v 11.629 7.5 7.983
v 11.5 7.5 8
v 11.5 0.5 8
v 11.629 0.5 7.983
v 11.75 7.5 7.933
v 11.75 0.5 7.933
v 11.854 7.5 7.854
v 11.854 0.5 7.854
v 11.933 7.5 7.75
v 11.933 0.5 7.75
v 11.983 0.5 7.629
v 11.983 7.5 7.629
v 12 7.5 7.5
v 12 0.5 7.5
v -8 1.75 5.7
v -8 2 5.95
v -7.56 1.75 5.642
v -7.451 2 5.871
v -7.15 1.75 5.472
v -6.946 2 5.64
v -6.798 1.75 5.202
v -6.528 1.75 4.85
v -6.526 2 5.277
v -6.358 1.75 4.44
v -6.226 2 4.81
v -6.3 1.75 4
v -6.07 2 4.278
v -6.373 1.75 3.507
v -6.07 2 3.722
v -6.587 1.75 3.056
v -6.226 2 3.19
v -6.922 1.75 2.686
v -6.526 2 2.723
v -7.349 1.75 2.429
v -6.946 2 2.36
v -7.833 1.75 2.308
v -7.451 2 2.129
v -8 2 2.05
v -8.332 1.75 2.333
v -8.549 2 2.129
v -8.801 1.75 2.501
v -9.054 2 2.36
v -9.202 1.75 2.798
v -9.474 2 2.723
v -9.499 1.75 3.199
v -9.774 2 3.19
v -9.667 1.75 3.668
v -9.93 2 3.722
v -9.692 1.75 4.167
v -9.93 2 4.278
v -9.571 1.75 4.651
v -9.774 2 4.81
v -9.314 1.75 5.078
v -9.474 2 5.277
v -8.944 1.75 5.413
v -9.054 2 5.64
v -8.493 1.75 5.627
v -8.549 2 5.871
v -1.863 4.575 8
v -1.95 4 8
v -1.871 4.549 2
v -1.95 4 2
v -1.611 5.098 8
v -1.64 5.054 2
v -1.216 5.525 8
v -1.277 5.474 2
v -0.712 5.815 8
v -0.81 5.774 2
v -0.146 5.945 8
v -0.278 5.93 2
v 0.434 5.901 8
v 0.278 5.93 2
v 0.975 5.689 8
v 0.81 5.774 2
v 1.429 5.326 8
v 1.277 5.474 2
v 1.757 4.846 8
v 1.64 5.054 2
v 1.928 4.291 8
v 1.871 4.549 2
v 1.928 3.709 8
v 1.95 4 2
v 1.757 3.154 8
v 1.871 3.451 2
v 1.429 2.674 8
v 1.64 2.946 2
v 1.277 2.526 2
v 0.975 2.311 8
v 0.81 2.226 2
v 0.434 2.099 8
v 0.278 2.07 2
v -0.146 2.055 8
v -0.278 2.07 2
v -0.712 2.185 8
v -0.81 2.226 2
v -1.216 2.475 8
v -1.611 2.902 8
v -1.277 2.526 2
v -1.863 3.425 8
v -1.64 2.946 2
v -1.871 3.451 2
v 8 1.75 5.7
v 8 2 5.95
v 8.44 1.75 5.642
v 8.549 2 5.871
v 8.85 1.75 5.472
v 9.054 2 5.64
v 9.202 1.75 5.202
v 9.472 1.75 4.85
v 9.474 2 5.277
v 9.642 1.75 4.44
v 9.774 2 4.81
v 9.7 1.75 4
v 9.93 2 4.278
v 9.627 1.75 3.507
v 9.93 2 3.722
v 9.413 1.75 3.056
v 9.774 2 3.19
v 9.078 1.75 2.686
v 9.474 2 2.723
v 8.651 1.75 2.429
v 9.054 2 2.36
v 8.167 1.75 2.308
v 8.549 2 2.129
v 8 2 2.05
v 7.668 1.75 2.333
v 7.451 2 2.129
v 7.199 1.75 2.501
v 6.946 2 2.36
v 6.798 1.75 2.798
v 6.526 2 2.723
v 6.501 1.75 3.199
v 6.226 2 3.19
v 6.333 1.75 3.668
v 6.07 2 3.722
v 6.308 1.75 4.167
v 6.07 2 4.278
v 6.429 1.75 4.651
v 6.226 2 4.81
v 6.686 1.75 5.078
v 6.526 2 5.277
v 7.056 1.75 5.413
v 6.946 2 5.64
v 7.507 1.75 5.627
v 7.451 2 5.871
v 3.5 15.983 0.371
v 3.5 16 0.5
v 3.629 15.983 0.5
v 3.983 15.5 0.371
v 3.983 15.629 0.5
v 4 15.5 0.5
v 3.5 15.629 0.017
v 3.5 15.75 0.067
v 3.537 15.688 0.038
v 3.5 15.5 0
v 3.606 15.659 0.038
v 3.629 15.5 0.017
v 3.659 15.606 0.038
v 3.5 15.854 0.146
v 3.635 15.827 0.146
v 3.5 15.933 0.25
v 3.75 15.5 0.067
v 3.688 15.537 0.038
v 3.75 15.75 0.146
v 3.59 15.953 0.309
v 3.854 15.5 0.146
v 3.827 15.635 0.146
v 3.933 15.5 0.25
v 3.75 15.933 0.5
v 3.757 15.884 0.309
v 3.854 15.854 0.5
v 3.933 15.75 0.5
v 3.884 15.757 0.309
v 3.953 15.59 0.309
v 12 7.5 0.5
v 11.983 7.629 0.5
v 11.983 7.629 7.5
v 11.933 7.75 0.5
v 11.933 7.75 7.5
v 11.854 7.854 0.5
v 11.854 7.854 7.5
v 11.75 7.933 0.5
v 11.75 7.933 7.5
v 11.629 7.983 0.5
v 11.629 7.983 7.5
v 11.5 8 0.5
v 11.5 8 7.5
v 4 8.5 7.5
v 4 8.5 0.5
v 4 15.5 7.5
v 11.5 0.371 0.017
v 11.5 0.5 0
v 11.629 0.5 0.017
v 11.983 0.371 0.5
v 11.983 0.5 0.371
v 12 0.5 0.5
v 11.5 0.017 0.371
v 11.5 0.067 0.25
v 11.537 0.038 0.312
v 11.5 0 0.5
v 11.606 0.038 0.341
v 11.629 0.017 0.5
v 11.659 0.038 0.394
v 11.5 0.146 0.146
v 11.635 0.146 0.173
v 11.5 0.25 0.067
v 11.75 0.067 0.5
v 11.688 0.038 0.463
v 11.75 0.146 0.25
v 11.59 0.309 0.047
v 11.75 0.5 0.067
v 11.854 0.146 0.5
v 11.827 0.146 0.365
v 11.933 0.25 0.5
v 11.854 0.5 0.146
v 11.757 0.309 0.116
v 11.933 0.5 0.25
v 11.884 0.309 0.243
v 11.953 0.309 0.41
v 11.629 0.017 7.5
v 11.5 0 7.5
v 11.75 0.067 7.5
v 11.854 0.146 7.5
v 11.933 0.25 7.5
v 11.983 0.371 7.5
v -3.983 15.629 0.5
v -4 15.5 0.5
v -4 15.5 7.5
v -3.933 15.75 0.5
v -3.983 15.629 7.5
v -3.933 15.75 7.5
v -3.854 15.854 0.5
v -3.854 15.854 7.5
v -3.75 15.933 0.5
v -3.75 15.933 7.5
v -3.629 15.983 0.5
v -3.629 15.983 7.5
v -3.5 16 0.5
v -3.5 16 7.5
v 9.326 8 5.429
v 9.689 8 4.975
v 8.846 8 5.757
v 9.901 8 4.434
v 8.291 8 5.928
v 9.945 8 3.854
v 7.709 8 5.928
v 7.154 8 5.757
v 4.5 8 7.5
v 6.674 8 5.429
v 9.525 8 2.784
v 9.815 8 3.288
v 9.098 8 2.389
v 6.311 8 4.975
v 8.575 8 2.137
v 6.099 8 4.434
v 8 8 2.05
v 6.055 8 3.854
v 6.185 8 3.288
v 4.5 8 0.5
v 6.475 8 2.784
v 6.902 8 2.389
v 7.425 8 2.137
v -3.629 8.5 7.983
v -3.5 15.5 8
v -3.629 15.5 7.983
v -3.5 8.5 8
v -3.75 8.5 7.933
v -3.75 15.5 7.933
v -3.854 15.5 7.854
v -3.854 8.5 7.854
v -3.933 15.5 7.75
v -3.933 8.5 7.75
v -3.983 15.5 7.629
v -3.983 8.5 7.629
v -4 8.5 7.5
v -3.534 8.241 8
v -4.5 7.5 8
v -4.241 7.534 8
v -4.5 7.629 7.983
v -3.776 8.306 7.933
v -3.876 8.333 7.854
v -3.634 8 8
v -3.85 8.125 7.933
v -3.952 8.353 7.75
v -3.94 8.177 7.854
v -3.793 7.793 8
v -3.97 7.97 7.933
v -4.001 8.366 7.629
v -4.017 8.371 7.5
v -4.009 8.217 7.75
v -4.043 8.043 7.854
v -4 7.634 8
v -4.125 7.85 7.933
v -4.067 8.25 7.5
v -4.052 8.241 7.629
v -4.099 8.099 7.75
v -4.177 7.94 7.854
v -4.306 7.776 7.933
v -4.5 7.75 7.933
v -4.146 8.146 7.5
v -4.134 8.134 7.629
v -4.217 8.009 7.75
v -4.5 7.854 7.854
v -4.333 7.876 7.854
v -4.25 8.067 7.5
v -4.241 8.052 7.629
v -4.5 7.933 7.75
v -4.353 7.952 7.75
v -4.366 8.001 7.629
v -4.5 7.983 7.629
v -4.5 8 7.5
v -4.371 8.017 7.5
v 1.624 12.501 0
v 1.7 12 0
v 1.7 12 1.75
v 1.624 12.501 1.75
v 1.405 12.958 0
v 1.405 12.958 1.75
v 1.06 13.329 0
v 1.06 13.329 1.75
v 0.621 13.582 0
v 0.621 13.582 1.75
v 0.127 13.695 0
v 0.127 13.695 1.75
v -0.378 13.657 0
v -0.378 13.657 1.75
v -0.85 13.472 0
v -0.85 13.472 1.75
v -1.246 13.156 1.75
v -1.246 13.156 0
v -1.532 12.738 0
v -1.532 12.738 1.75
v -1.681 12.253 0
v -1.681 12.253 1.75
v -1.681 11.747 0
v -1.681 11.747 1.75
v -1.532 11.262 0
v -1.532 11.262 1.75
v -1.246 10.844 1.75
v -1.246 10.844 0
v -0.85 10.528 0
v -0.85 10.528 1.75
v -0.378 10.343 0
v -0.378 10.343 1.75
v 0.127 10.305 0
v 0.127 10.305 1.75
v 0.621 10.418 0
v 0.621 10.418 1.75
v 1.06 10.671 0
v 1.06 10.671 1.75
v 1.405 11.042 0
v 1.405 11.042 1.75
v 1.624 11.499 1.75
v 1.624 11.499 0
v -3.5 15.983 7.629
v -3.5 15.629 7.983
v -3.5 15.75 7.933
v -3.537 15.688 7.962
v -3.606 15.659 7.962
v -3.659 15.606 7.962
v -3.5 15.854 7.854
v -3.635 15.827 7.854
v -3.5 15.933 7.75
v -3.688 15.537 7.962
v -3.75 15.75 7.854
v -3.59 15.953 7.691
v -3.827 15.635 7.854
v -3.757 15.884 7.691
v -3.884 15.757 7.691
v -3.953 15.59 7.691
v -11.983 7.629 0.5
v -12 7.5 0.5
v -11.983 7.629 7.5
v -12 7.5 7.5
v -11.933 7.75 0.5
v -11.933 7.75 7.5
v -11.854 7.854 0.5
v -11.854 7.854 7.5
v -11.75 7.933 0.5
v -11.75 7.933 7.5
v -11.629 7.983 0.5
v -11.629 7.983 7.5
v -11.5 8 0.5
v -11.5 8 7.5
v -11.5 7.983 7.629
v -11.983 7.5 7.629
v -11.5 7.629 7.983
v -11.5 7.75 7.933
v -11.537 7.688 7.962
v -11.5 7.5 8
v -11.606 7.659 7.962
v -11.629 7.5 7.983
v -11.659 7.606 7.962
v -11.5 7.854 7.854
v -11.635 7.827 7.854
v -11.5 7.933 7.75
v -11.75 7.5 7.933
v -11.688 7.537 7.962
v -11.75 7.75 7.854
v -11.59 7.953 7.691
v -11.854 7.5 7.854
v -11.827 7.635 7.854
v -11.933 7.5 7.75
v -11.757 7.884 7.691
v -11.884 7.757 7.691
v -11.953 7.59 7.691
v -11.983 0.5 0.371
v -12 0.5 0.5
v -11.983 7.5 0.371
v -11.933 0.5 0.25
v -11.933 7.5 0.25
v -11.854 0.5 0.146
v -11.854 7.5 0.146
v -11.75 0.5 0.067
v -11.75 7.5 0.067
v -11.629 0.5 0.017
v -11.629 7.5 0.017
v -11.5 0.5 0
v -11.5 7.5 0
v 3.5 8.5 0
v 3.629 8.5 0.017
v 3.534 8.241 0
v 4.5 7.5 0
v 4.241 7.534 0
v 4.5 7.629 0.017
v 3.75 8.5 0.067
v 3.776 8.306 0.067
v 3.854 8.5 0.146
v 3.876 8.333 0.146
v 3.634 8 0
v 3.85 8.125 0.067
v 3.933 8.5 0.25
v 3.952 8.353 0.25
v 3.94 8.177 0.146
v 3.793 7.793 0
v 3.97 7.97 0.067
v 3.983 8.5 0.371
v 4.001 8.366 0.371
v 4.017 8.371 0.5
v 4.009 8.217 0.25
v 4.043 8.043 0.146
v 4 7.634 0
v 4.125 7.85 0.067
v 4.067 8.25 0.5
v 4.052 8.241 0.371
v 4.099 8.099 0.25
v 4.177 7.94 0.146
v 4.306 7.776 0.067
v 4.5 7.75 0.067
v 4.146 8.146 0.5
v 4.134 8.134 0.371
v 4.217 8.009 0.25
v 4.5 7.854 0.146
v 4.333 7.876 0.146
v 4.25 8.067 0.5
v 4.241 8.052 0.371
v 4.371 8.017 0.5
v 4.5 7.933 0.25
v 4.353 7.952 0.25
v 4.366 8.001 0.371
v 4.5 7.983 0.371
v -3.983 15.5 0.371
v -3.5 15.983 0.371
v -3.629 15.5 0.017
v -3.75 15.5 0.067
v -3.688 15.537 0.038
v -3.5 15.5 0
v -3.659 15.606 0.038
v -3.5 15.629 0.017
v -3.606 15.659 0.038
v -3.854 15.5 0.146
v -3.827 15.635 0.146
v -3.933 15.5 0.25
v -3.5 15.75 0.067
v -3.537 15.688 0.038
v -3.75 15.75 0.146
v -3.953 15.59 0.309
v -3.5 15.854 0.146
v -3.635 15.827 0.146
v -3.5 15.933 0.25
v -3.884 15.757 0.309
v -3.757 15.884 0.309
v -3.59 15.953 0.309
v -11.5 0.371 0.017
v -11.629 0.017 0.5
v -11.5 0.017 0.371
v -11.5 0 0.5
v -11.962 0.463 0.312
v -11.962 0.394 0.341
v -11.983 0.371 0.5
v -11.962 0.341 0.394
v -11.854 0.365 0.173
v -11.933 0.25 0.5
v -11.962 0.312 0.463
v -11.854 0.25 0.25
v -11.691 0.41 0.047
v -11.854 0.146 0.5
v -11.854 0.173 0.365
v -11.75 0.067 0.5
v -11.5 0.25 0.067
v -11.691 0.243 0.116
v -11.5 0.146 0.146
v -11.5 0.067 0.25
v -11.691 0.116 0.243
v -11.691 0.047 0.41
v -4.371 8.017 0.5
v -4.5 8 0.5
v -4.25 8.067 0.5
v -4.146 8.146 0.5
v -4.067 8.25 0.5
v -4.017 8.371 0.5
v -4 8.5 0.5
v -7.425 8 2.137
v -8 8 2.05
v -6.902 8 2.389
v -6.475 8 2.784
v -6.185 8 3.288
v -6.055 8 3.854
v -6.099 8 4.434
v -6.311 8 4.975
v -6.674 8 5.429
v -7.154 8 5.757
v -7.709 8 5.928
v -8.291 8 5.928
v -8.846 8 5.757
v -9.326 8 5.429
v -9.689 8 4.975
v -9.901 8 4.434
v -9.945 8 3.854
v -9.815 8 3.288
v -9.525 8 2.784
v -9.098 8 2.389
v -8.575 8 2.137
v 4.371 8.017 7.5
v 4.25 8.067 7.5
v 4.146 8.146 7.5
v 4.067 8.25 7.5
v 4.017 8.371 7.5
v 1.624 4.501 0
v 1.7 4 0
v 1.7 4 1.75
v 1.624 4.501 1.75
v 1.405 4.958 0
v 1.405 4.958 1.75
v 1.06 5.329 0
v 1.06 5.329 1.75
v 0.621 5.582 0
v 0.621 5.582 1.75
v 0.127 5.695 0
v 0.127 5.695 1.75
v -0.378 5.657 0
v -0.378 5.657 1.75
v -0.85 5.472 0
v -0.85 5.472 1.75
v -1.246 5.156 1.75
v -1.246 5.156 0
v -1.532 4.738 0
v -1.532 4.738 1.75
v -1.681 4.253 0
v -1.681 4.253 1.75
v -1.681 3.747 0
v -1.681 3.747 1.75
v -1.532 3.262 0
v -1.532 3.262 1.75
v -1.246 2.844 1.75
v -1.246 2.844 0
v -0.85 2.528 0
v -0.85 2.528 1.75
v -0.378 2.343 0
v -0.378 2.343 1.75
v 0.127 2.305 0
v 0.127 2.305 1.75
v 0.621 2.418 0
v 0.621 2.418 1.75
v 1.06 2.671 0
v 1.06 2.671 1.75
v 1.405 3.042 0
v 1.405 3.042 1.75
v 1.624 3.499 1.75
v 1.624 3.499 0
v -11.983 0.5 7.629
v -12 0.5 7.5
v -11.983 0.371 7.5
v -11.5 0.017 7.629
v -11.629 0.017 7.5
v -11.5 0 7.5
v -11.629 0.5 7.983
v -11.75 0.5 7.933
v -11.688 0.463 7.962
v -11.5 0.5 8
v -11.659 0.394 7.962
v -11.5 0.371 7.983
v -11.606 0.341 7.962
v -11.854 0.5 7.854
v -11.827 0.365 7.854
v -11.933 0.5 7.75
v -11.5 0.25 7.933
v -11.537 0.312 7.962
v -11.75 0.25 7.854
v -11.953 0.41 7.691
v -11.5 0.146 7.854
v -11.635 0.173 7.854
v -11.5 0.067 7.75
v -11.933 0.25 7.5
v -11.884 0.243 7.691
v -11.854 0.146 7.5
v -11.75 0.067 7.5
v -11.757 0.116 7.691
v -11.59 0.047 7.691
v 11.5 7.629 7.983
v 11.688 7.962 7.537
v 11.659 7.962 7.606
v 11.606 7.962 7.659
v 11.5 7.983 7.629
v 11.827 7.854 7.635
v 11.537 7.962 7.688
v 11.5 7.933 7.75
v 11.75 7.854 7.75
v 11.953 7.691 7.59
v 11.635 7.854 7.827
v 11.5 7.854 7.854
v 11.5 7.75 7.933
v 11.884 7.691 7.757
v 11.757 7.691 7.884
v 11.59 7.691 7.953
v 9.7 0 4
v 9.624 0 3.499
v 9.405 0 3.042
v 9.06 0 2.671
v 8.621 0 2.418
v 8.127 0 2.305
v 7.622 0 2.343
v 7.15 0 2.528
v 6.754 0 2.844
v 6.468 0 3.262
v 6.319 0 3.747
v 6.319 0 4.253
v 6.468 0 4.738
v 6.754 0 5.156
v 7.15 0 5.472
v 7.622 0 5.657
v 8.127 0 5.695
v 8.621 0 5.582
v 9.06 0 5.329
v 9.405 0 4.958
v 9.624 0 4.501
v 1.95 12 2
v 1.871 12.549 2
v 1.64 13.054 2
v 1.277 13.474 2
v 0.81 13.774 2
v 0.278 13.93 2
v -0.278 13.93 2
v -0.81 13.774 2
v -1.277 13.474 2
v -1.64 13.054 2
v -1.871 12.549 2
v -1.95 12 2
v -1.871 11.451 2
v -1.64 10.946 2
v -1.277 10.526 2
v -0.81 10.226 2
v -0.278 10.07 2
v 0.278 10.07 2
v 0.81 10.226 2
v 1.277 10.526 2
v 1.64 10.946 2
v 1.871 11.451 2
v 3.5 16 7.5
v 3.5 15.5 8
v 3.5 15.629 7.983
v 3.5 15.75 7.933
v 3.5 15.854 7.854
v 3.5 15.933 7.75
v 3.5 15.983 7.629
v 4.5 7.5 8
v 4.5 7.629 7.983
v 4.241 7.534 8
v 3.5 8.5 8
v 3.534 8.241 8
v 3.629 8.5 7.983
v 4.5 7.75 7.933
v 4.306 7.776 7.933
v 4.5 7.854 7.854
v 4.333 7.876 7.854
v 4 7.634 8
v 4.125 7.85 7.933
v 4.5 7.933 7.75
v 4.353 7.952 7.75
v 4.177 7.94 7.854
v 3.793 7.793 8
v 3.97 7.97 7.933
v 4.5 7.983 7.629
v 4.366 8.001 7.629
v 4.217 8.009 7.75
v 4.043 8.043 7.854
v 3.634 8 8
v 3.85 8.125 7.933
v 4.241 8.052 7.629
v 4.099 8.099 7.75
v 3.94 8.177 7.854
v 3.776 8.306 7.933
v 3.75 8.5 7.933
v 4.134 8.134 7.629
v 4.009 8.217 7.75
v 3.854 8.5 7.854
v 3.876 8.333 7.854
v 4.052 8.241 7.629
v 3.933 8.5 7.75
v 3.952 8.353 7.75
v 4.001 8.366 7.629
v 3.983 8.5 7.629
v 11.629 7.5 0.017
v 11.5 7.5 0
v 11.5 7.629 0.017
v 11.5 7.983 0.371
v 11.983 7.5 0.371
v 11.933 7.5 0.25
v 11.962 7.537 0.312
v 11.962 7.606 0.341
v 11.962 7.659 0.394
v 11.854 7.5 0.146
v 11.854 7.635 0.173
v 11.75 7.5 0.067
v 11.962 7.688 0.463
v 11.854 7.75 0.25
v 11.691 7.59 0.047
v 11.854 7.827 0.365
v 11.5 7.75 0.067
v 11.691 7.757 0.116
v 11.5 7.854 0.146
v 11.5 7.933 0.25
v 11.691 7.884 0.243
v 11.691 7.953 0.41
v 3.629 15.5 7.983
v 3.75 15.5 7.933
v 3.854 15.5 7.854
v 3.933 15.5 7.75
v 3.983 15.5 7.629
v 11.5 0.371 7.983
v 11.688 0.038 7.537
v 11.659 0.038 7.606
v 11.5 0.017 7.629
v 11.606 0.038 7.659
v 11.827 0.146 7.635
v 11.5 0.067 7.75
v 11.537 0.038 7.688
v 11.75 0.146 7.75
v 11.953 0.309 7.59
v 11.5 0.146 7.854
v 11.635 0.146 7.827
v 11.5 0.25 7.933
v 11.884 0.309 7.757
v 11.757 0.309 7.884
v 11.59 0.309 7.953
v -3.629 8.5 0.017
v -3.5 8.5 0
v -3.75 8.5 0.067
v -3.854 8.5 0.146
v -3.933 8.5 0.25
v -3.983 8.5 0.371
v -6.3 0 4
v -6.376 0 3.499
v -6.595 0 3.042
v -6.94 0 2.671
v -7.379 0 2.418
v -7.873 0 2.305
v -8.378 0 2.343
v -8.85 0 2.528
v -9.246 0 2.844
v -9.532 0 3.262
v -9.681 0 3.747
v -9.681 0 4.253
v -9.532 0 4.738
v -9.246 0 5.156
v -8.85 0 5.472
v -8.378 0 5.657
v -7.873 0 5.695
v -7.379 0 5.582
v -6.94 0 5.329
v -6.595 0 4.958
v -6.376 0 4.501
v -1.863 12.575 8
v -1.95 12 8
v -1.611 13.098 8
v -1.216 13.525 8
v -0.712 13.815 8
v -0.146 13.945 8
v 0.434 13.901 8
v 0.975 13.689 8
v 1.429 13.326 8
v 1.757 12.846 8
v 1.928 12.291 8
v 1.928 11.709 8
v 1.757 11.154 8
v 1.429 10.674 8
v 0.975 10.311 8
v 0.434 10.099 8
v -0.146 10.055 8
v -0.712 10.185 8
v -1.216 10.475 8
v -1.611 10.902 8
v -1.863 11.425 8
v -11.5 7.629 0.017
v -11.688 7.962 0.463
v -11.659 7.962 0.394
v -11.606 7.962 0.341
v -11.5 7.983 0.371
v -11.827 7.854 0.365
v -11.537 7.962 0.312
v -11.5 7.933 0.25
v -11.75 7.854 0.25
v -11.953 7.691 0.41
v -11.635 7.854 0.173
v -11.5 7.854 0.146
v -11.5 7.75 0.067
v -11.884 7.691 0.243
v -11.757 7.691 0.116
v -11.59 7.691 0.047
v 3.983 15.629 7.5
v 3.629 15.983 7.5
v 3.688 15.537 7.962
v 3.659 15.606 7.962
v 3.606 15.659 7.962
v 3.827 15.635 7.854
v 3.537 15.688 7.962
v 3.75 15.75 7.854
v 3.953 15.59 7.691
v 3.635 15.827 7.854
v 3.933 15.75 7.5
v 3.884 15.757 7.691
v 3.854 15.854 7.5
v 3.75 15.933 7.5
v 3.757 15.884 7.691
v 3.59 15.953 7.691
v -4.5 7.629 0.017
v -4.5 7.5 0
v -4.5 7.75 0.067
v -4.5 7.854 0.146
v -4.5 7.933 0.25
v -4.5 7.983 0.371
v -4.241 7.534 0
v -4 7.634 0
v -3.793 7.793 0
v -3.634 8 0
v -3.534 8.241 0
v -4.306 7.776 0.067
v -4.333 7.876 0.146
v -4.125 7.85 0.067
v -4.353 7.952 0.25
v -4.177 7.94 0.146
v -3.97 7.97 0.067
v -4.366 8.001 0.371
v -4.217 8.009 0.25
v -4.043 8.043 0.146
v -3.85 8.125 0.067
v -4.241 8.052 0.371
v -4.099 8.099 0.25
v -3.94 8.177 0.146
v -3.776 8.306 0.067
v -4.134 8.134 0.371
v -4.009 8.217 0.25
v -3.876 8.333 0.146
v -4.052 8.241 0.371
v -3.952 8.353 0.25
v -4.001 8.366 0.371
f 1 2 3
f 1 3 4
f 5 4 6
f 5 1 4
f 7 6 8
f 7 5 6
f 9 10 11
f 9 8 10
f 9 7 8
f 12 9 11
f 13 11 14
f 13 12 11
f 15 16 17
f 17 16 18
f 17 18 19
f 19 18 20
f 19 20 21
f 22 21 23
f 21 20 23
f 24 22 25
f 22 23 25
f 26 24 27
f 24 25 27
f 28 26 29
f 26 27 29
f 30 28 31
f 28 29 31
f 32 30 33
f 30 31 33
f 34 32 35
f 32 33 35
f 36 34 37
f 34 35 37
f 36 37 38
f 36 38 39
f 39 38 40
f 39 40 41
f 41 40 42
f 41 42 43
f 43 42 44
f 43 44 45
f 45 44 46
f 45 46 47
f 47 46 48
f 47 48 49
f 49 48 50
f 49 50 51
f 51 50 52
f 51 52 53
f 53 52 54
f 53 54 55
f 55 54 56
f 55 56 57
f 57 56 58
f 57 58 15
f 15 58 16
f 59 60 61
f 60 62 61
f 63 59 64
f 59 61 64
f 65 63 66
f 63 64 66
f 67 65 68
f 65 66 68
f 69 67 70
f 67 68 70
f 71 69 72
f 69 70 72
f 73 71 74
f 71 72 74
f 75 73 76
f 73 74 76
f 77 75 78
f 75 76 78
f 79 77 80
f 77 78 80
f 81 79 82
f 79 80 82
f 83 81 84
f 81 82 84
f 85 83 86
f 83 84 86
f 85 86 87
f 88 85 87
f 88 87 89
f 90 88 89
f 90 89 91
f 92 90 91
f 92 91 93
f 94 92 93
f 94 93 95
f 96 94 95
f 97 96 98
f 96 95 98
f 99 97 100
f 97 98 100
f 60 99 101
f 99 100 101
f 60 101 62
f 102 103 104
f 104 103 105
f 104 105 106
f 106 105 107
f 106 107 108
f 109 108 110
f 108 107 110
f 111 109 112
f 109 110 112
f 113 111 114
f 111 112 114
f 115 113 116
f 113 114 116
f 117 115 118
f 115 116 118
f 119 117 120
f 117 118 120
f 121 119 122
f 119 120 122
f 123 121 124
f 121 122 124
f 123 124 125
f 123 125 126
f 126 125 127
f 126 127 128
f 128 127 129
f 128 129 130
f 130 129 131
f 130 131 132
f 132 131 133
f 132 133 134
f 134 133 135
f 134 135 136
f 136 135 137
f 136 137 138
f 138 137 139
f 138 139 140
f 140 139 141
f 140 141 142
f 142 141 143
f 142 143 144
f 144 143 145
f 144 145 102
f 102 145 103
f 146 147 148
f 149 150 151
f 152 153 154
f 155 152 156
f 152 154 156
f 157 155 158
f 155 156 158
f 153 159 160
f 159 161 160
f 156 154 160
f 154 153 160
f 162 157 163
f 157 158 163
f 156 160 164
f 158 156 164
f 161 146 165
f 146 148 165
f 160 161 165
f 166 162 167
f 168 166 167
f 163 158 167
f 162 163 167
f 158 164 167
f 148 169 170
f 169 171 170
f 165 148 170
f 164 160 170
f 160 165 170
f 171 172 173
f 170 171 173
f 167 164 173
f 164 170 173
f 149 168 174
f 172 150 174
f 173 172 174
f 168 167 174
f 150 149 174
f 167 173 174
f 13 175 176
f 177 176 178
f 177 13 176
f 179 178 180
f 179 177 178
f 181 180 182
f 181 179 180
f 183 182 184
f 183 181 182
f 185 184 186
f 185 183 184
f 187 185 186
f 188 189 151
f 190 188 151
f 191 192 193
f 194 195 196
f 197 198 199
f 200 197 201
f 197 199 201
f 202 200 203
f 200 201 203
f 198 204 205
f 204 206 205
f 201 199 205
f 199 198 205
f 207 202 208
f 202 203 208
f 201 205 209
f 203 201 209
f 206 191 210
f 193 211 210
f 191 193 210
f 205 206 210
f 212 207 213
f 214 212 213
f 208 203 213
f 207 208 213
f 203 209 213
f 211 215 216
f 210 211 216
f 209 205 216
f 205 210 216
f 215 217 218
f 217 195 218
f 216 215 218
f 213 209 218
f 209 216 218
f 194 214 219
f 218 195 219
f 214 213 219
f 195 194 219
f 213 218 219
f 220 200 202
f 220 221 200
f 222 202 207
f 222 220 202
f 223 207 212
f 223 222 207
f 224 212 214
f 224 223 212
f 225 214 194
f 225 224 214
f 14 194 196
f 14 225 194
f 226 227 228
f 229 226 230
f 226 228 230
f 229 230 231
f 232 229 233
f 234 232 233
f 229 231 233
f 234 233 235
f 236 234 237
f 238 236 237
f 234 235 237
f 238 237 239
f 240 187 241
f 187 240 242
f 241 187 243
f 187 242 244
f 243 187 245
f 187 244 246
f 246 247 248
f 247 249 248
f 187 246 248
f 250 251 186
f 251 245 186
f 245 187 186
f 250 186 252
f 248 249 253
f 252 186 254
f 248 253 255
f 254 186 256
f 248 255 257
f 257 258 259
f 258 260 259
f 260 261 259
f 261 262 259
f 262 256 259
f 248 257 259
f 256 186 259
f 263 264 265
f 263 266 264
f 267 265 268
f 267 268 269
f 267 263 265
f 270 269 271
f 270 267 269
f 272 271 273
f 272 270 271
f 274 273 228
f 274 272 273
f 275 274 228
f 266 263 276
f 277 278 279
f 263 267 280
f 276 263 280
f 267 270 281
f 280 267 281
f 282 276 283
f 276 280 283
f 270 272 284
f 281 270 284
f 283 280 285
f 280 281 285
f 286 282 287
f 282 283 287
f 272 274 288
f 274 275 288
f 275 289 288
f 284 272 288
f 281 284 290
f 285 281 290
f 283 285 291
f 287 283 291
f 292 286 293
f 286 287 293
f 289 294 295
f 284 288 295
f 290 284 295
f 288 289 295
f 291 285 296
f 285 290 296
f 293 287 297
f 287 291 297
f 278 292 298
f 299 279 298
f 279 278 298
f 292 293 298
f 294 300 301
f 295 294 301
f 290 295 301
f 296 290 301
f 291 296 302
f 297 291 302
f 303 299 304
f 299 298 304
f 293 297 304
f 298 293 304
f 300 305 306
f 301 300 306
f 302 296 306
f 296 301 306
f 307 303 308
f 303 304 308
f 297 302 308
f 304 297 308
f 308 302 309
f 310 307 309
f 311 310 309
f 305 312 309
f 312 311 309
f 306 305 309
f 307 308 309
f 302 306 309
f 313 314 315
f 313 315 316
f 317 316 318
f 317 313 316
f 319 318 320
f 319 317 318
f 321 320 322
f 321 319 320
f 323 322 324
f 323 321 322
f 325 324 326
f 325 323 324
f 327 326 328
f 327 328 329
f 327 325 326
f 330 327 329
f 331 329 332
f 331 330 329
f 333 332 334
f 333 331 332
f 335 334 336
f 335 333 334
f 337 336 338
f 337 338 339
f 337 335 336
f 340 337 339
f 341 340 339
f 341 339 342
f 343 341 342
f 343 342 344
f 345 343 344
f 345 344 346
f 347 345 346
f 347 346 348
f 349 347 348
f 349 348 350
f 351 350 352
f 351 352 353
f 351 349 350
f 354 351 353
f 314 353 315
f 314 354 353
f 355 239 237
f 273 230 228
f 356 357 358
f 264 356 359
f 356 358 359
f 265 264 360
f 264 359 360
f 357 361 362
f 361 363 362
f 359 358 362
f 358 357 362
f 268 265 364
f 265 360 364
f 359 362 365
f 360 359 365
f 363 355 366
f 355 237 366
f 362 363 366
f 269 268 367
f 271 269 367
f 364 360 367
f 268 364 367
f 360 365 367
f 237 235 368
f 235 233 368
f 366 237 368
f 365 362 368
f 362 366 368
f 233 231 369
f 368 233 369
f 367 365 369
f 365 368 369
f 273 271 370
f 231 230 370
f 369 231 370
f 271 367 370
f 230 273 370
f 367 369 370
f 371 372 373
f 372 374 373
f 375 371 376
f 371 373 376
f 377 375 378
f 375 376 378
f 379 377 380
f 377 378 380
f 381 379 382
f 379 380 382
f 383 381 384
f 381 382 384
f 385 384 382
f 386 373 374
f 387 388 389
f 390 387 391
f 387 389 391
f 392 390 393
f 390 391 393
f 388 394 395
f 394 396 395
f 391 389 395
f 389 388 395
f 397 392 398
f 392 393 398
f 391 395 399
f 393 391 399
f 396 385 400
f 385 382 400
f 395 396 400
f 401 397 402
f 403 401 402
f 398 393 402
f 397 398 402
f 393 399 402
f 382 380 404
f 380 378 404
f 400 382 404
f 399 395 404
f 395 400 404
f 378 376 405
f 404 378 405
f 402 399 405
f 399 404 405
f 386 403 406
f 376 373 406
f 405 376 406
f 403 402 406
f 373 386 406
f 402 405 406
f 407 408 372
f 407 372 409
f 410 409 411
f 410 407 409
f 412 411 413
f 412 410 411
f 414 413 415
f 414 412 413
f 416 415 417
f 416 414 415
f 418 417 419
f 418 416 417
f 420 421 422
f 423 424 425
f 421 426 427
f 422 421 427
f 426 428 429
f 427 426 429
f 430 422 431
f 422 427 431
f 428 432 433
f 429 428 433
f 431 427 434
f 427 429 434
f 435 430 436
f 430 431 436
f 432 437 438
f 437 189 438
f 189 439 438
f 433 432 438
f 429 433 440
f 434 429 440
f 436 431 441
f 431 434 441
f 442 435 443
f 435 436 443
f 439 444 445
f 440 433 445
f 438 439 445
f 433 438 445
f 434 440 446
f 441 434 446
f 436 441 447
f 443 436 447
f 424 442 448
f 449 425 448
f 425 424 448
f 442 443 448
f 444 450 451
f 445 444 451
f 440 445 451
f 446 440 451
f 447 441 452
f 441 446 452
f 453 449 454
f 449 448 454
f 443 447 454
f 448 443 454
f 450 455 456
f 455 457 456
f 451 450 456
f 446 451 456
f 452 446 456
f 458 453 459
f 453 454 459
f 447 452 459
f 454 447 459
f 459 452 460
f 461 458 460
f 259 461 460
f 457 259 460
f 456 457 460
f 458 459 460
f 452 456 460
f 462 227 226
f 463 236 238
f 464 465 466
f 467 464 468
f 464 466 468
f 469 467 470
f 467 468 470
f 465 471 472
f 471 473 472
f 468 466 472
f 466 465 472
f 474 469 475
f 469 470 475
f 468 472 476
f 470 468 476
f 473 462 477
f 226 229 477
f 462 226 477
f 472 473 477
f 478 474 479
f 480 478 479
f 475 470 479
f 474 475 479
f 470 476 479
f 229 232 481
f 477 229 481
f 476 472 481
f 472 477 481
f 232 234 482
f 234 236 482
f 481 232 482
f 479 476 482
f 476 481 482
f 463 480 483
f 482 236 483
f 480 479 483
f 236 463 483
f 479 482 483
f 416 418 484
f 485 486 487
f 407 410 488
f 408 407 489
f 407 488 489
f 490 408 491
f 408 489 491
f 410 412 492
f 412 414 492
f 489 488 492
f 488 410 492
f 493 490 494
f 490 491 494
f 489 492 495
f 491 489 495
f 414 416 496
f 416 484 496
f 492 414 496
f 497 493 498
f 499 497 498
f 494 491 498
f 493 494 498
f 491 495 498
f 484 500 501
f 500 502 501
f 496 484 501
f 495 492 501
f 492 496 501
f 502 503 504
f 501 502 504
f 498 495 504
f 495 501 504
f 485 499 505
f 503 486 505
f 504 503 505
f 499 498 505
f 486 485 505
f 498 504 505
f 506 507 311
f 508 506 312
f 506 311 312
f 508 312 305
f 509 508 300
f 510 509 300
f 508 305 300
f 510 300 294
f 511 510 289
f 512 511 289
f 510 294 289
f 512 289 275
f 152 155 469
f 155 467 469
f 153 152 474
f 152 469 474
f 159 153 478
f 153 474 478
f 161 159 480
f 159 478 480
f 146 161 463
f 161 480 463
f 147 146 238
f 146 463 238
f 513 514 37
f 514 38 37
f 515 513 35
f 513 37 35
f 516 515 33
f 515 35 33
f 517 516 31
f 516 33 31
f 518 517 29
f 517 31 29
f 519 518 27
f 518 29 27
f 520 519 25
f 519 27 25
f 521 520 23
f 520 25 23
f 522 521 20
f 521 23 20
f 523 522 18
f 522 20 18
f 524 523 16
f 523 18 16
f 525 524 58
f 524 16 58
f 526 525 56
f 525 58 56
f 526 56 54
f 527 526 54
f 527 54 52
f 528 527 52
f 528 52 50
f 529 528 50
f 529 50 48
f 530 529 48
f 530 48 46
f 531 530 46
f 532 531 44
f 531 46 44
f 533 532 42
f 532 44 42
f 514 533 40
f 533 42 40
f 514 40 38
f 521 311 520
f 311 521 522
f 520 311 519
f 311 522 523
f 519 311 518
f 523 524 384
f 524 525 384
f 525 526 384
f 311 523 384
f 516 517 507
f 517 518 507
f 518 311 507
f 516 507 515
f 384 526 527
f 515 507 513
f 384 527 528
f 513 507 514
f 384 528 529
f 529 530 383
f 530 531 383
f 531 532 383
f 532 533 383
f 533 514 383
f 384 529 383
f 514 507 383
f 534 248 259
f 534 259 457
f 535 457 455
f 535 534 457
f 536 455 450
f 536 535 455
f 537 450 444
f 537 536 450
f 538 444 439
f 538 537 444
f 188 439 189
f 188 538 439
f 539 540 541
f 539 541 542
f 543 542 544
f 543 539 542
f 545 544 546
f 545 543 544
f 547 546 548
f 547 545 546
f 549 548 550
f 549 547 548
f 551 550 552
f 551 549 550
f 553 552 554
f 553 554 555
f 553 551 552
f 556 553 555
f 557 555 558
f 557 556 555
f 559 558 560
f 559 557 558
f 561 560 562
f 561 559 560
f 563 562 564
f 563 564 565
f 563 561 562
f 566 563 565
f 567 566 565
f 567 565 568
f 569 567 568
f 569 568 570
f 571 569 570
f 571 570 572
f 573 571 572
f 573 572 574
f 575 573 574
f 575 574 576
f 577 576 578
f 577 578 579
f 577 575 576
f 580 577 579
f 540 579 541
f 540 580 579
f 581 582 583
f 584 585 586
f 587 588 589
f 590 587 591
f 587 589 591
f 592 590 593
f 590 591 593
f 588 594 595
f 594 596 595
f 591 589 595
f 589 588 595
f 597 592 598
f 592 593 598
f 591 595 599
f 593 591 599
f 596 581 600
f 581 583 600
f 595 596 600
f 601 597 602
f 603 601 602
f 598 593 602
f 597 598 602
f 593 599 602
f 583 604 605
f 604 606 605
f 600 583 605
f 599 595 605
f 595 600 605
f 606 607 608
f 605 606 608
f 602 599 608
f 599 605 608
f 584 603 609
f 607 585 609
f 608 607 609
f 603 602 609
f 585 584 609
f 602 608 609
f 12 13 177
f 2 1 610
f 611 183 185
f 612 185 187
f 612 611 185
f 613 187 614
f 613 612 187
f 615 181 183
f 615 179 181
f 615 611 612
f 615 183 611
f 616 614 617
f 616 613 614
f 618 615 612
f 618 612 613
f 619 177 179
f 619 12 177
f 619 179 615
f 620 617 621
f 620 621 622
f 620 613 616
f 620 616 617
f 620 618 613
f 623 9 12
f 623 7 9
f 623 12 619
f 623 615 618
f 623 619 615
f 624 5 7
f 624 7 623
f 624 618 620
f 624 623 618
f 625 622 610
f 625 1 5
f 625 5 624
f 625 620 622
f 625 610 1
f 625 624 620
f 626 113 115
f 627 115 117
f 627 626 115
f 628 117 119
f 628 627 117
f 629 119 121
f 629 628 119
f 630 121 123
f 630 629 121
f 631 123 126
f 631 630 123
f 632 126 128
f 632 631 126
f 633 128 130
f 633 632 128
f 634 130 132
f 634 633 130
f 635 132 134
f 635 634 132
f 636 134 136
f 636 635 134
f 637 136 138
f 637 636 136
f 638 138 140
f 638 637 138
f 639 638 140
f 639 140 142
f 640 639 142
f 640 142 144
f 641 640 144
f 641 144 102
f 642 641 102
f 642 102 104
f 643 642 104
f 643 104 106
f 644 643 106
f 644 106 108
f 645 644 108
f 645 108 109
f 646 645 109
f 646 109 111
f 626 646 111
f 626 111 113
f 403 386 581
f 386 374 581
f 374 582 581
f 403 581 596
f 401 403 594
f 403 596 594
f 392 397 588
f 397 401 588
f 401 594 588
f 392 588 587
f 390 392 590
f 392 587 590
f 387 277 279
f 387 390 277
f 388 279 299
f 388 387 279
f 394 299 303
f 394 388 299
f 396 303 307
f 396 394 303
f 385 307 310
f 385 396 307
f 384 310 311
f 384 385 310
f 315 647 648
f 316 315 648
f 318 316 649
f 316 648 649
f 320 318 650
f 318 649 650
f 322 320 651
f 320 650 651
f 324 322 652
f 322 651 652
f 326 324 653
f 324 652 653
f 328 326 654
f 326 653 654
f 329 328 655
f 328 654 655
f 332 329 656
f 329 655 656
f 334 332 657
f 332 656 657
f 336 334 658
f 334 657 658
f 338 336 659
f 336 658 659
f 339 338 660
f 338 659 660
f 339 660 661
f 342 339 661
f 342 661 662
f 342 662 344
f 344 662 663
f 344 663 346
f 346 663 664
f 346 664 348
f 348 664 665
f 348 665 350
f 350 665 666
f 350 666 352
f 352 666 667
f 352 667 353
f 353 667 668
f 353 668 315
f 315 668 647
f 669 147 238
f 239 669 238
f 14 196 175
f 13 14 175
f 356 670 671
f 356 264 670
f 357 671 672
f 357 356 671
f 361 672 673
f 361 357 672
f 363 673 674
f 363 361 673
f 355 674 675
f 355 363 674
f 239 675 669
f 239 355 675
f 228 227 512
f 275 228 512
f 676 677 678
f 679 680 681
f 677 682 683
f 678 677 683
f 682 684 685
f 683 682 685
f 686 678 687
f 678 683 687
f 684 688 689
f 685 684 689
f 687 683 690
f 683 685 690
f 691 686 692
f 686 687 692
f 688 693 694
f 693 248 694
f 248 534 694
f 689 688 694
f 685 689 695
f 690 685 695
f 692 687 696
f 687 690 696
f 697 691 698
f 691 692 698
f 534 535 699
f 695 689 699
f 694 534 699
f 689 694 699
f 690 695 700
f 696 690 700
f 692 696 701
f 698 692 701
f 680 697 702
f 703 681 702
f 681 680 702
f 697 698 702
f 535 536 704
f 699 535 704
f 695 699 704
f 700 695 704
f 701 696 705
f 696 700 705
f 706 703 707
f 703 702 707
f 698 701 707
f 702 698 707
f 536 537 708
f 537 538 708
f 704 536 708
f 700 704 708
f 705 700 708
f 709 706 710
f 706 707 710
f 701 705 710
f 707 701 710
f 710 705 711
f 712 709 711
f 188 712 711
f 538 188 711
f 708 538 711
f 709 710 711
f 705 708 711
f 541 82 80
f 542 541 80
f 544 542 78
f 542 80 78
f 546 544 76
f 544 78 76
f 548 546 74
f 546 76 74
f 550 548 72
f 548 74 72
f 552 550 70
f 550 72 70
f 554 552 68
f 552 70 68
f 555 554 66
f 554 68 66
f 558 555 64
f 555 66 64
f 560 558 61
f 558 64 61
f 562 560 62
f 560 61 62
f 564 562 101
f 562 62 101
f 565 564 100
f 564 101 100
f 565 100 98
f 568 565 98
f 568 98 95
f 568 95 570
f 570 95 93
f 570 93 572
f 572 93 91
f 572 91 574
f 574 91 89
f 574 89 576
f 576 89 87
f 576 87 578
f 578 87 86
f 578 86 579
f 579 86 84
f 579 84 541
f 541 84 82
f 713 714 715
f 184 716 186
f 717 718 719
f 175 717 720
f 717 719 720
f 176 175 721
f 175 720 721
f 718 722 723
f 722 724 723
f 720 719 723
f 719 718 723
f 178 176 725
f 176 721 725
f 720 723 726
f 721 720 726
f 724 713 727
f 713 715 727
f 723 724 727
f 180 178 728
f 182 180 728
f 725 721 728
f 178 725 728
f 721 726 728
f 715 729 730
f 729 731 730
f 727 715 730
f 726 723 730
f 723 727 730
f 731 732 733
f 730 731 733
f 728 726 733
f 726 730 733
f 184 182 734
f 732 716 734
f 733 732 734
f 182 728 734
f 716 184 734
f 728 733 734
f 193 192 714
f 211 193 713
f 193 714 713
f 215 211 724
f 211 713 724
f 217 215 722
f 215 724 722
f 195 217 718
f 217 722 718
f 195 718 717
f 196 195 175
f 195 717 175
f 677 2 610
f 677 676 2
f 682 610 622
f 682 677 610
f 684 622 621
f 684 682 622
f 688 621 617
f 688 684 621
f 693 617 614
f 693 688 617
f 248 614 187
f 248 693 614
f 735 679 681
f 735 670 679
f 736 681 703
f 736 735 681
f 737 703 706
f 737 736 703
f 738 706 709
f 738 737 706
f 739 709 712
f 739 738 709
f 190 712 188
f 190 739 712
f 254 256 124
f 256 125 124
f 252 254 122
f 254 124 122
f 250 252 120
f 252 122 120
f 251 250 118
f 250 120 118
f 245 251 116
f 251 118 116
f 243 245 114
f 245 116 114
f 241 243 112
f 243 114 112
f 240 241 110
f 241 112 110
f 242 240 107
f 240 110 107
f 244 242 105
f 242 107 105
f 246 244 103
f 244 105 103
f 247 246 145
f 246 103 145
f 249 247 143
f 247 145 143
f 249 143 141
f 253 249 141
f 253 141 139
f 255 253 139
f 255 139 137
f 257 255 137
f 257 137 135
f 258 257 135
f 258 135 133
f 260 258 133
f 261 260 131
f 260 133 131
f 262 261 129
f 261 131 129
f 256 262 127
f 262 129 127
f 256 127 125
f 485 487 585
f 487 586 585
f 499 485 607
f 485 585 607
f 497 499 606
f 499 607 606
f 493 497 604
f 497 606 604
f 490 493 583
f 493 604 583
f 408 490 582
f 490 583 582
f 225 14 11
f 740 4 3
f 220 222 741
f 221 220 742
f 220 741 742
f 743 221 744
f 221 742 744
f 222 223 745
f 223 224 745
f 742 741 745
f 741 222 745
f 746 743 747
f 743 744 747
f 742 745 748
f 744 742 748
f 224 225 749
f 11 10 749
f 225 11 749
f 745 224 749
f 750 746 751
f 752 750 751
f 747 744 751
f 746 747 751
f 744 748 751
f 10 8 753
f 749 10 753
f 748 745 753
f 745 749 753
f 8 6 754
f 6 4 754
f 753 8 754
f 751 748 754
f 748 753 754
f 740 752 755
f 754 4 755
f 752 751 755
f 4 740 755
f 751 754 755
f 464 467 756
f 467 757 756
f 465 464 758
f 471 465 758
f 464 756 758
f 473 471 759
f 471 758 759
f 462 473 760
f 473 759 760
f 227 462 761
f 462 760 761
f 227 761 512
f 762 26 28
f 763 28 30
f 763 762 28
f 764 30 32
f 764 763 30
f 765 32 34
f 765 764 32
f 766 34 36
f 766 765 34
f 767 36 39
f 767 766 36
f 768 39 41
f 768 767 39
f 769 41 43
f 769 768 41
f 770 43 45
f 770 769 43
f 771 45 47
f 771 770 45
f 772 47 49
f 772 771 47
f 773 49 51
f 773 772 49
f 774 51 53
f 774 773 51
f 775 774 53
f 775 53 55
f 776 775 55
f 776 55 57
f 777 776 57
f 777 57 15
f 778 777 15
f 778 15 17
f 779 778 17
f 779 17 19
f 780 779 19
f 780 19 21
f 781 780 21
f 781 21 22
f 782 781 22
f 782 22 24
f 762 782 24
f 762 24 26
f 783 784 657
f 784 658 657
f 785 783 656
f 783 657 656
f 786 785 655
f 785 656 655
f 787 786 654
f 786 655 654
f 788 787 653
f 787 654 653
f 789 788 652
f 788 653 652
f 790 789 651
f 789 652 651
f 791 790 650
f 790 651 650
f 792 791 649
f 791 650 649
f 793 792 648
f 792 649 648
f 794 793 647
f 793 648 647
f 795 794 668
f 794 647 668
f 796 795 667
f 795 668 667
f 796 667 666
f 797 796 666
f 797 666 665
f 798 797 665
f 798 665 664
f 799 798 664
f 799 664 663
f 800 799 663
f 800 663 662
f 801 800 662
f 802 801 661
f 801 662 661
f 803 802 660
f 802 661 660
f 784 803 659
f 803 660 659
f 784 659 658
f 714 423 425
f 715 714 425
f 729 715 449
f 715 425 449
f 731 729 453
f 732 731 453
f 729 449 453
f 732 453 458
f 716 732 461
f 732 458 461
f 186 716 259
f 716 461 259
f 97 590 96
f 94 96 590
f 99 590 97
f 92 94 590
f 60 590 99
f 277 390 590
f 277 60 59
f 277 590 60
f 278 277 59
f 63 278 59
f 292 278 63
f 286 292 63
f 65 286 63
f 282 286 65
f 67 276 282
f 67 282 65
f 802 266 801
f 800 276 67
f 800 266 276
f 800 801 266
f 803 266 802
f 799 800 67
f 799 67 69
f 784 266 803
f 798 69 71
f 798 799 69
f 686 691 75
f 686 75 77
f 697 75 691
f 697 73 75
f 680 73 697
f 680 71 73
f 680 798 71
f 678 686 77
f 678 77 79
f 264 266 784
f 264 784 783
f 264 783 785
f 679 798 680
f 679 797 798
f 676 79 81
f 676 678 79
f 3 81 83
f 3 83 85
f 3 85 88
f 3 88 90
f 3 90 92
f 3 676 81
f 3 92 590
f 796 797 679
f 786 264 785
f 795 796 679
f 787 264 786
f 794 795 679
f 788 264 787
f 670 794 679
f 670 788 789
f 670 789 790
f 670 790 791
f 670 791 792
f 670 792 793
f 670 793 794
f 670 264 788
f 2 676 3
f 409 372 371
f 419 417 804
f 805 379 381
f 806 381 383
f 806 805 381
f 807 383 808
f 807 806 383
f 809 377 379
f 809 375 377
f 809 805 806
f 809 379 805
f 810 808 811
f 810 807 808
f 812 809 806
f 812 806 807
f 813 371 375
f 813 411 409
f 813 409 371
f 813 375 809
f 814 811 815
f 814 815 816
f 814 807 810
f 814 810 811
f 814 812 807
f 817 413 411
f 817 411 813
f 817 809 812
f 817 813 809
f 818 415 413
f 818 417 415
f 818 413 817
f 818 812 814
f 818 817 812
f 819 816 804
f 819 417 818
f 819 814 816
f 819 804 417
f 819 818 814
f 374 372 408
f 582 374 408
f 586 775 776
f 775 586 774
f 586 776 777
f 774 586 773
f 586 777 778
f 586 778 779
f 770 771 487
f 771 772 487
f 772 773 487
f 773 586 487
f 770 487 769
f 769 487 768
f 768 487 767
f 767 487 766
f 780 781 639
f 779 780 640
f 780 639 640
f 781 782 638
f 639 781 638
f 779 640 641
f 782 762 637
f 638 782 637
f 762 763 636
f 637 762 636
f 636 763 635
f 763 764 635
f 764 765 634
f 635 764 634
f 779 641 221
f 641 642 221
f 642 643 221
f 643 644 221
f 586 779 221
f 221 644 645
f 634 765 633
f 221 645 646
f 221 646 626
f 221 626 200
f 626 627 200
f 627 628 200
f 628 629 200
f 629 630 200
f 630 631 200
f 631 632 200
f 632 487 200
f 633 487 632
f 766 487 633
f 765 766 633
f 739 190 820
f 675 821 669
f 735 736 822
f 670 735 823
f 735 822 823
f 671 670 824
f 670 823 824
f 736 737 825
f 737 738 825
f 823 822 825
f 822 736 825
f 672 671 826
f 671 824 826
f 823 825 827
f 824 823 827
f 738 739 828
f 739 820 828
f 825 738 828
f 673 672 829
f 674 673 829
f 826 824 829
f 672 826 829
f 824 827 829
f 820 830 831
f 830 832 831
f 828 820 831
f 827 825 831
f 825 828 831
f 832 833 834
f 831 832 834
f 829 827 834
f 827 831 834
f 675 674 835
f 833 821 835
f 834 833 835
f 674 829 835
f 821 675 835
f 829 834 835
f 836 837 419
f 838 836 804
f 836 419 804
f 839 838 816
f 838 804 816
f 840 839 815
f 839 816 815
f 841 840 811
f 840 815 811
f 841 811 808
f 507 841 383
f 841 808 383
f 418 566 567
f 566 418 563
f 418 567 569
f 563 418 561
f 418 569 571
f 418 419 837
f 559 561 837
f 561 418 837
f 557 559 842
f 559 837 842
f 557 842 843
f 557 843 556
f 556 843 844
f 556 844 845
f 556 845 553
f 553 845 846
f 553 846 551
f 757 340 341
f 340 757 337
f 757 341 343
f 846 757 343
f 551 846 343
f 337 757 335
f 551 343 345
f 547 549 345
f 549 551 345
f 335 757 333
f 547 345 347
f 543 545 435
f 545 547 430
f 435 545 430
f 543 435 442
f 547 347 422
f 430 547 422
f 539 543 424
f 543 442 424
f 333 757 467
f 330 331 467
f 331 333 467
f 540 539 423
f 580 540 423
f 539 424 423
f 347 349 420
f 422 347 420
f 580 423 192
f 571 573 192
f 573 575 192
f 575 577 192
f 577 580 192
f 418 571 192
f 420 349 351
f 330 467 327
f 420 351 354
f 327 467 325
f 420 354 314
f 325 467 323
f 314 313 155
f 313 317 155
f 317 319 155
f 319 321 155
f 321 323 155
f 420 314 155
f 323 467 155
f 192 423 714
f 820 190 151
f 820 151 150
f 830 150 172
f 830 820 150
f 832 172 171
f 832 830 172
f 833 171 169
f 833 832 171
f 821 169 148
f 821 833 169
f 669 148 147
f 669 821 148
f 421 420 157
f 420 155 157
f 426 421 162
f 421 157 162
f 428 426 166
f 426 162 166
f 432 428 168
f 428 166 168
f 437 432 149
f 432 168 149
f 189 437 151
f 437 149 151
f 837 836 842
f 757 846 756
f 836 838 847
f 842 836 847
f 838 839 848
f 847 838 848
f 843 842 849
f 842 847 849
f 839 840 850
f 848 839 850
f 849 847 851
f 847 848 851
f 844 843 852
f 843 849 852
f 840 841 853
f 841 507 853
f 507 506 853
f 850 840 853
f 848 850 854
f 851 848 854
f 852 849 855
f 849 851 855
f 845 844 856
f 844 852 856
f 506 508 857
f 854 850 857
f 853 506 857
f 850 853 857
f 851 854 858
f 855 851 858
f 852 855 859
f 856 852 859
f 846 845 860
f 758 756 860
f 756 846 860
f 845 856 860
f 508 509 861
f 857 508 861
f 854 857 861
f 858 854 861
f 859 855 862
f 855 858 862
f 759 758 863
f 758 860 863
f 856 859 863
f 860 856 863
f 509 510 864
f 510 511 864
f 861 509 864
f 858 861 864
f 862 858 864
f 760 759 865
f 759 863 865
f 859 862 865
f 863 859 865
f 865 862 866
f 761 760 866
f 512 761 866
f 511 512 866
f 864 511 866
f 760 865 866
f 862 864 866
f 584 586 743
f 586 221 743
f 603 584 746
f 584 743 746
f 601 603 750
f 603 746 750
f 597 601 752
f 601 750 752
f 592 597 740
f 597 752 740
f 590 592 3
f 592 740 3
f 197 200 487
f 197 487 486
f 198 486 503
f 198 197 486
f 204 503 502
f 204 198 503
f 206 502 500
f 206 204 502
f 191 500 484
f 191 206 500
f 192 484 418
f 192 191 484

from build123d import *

# Parameters (mm, degrees)
BOSS_EXTRUDE1_DEPTH                      = 8
F_3_9_3_9_DIAMETER_HOLE1_D               = 3.9
F_3_9_3_9_DIAMETER_HOLE1_DEPTH           = 6
F_3_9_3_9_DIAMETER_HOLE1_TIP             = 1.95
F_3_9_3_9_DIAMETER_HOLE1_ON_FACE_2_D     = 3.9
F_3_9_3_9_DIAMETER_HOLE1_ON_FACE_2_DEPTH = 6
F_3_9_3_9_DIAMETER_HOLE1_ON_FACE_2_TIP   = 1.95
F_3_4_3_4_DIAMETER_HOLE1_OUTLINE_R       = 1.7
F_3_4_3_4_DIAMETER_HOLE1_DEPTH           = 1.7500001
F_3_4_3_4_DIAMETER_HOLE1_2_OUTLINE_R     = 1.7
F_3_4_3_4_DIAMETER_HOLE1_2_DEPTH         = 1.7500001
FILLET1_R                                = 0.5


# Read off the part's stored shape, not the designer's step: Ø3.4 (3.4) Diameter Hole1
with BuildPart() as part:
    # Sketch1 → Boss-Extrude1 (new body)
    with BuildSketch(Plane.XY):
        Polygon((-12, 0), (12, 0), (12, 8), (4, 8), (4, 16), (-4, 16), (-4, 8), (-12, 8), align=None)
    extrude(amount=BOSS_EXTRUDE1_DEPTH)

    # Ø3.9 (3.9) Diameter Hole1
    with Locations(Plane(origin=(0, 4, 8), x_dir=(1, 0, 0), z_dir=(0, 0, 1))):
        with Locations((0, 0), (0, 8)):
            Hole(F_3_9_3_9_DIAMETER_HOLE1_D / 2, depth=F_3_9_3_9_DIAMETER_HOLE1_DEPTH)
            with Locations((0, 0, -(F_3_9_3_9_DIAMETER_HOLE1_DEPTH + F_3_9_3_9_DIAMETER_HOLE1_TIP / 2))):  # 90° drill point
                Cone(0, F_3_9_3_9_DIAMETER_HOLE1_D / 2, F_3_9_3_9_DIAMETER_HOLE1_TIP, mode=Mode.SUBTRACT)

    # Ø3.9 (3.9) Diameter Hole1 on face 2
    with Locations(Plane(origin=(8, 8, 4), x_dir=(0, 0, 1), z_dir=(0, 1, 0))):
        with Locations((0, 0), (0, -16)):
            Hole(F_3_9_3_9_DIAMETER_HOLE1_ON_FACE_2_D / 2, depth=F_3_9_3_9_DIAMETER_HOLE1_ON_FACE_2_DEPTH)
            with Locations((0, 0, -(F_3_9_3_9_DIAMETER_HOLE1_ON_FACE_2_DEPTH + F_3_9_3_9_DIAMETER_HOLE1_ON_FACE_2_TIP / 2))):  # 90° drill point
                Cone(0, F_3_9_3_9_DIAMETER_HOLE1_ON_FACE_2_D / 2, F_3_9_3_9_DIAMETER_HOLE1_ON_FACE_2_TIP, mode=Mode.SUBTRACT)

    # Ø3.4 (3.4) Diameter Hole1 outline → Ø3.4 (3.4) Diameter Hole1 (cut)
    with BuildSketch(Plane(origin=(0, 0, 0), x_dir=(1, 0, 0), z_dir=(0, 1, 0))):
        with Locations((-8, -4)):
            Circle(F_3_4_3_4_DIAMETER_HOLE1_OUTLINE_R)
        with Locations((8, -4)):
            Circle(F_3_4_3_4_DIAMETER_HOLE1_OUTLINE_R)
    extrude(amount=F_3_4_3_4_DIAMETER_HOLE1_DEPTH, mode=Mode.SUBTRACT)

    # 3.4 _3.4_ Diameter Hole1 2 outline → 3.4 _3.4_ Diameter Hole1 2 (cut)
    with BuildSketch(Plane.XY):
        with Locations((0, 4)):
            Circle(F_3_4_3_4_DIAMETER_HOLE1_2_OUTLINE_R)
        with Locations((0, 12)):
            Circle(F_3_4_3_4_DIAMETER_HOLE1_2_OUTLINE_R)
    extrude(amount=F_3_4_3_4_DIAMETER_HOLE1_2_DEPTH, mode=Mode.SUBTRACT)

    # Fillet1
    fillet1_edges = [part.edges().sort_by_distance(p)[0] for p in [
        (8, 8, 0),
        (12, 4, 0),
        (0, 0, 0),
        (-12, 4, 0),
        (12, 4, 8),
        (-12, 8, 4),
        (-4, 8, 4),
        (-4, 16, 4),
        (4, 16, 4),
        (4, 8, 4),
        (12, 8, 4),
        (12, 0, 4),
        (-12, 0, 4),
        (8, 8, 8),
        (4, 12, 8),
        (0, 16, 8),
        (-4, 12, 8),
        (-8, 8, 8),
        (-12, 4, 8),
        (-8, 8, 0),
        (0, 0, 8),
        (-4, 12, 0),
        (0, 16, 0),
        (4, 12, 0),
    ]]
    fillet(fillet1_edges, radius=FILLET1_R)


solid = part.part
